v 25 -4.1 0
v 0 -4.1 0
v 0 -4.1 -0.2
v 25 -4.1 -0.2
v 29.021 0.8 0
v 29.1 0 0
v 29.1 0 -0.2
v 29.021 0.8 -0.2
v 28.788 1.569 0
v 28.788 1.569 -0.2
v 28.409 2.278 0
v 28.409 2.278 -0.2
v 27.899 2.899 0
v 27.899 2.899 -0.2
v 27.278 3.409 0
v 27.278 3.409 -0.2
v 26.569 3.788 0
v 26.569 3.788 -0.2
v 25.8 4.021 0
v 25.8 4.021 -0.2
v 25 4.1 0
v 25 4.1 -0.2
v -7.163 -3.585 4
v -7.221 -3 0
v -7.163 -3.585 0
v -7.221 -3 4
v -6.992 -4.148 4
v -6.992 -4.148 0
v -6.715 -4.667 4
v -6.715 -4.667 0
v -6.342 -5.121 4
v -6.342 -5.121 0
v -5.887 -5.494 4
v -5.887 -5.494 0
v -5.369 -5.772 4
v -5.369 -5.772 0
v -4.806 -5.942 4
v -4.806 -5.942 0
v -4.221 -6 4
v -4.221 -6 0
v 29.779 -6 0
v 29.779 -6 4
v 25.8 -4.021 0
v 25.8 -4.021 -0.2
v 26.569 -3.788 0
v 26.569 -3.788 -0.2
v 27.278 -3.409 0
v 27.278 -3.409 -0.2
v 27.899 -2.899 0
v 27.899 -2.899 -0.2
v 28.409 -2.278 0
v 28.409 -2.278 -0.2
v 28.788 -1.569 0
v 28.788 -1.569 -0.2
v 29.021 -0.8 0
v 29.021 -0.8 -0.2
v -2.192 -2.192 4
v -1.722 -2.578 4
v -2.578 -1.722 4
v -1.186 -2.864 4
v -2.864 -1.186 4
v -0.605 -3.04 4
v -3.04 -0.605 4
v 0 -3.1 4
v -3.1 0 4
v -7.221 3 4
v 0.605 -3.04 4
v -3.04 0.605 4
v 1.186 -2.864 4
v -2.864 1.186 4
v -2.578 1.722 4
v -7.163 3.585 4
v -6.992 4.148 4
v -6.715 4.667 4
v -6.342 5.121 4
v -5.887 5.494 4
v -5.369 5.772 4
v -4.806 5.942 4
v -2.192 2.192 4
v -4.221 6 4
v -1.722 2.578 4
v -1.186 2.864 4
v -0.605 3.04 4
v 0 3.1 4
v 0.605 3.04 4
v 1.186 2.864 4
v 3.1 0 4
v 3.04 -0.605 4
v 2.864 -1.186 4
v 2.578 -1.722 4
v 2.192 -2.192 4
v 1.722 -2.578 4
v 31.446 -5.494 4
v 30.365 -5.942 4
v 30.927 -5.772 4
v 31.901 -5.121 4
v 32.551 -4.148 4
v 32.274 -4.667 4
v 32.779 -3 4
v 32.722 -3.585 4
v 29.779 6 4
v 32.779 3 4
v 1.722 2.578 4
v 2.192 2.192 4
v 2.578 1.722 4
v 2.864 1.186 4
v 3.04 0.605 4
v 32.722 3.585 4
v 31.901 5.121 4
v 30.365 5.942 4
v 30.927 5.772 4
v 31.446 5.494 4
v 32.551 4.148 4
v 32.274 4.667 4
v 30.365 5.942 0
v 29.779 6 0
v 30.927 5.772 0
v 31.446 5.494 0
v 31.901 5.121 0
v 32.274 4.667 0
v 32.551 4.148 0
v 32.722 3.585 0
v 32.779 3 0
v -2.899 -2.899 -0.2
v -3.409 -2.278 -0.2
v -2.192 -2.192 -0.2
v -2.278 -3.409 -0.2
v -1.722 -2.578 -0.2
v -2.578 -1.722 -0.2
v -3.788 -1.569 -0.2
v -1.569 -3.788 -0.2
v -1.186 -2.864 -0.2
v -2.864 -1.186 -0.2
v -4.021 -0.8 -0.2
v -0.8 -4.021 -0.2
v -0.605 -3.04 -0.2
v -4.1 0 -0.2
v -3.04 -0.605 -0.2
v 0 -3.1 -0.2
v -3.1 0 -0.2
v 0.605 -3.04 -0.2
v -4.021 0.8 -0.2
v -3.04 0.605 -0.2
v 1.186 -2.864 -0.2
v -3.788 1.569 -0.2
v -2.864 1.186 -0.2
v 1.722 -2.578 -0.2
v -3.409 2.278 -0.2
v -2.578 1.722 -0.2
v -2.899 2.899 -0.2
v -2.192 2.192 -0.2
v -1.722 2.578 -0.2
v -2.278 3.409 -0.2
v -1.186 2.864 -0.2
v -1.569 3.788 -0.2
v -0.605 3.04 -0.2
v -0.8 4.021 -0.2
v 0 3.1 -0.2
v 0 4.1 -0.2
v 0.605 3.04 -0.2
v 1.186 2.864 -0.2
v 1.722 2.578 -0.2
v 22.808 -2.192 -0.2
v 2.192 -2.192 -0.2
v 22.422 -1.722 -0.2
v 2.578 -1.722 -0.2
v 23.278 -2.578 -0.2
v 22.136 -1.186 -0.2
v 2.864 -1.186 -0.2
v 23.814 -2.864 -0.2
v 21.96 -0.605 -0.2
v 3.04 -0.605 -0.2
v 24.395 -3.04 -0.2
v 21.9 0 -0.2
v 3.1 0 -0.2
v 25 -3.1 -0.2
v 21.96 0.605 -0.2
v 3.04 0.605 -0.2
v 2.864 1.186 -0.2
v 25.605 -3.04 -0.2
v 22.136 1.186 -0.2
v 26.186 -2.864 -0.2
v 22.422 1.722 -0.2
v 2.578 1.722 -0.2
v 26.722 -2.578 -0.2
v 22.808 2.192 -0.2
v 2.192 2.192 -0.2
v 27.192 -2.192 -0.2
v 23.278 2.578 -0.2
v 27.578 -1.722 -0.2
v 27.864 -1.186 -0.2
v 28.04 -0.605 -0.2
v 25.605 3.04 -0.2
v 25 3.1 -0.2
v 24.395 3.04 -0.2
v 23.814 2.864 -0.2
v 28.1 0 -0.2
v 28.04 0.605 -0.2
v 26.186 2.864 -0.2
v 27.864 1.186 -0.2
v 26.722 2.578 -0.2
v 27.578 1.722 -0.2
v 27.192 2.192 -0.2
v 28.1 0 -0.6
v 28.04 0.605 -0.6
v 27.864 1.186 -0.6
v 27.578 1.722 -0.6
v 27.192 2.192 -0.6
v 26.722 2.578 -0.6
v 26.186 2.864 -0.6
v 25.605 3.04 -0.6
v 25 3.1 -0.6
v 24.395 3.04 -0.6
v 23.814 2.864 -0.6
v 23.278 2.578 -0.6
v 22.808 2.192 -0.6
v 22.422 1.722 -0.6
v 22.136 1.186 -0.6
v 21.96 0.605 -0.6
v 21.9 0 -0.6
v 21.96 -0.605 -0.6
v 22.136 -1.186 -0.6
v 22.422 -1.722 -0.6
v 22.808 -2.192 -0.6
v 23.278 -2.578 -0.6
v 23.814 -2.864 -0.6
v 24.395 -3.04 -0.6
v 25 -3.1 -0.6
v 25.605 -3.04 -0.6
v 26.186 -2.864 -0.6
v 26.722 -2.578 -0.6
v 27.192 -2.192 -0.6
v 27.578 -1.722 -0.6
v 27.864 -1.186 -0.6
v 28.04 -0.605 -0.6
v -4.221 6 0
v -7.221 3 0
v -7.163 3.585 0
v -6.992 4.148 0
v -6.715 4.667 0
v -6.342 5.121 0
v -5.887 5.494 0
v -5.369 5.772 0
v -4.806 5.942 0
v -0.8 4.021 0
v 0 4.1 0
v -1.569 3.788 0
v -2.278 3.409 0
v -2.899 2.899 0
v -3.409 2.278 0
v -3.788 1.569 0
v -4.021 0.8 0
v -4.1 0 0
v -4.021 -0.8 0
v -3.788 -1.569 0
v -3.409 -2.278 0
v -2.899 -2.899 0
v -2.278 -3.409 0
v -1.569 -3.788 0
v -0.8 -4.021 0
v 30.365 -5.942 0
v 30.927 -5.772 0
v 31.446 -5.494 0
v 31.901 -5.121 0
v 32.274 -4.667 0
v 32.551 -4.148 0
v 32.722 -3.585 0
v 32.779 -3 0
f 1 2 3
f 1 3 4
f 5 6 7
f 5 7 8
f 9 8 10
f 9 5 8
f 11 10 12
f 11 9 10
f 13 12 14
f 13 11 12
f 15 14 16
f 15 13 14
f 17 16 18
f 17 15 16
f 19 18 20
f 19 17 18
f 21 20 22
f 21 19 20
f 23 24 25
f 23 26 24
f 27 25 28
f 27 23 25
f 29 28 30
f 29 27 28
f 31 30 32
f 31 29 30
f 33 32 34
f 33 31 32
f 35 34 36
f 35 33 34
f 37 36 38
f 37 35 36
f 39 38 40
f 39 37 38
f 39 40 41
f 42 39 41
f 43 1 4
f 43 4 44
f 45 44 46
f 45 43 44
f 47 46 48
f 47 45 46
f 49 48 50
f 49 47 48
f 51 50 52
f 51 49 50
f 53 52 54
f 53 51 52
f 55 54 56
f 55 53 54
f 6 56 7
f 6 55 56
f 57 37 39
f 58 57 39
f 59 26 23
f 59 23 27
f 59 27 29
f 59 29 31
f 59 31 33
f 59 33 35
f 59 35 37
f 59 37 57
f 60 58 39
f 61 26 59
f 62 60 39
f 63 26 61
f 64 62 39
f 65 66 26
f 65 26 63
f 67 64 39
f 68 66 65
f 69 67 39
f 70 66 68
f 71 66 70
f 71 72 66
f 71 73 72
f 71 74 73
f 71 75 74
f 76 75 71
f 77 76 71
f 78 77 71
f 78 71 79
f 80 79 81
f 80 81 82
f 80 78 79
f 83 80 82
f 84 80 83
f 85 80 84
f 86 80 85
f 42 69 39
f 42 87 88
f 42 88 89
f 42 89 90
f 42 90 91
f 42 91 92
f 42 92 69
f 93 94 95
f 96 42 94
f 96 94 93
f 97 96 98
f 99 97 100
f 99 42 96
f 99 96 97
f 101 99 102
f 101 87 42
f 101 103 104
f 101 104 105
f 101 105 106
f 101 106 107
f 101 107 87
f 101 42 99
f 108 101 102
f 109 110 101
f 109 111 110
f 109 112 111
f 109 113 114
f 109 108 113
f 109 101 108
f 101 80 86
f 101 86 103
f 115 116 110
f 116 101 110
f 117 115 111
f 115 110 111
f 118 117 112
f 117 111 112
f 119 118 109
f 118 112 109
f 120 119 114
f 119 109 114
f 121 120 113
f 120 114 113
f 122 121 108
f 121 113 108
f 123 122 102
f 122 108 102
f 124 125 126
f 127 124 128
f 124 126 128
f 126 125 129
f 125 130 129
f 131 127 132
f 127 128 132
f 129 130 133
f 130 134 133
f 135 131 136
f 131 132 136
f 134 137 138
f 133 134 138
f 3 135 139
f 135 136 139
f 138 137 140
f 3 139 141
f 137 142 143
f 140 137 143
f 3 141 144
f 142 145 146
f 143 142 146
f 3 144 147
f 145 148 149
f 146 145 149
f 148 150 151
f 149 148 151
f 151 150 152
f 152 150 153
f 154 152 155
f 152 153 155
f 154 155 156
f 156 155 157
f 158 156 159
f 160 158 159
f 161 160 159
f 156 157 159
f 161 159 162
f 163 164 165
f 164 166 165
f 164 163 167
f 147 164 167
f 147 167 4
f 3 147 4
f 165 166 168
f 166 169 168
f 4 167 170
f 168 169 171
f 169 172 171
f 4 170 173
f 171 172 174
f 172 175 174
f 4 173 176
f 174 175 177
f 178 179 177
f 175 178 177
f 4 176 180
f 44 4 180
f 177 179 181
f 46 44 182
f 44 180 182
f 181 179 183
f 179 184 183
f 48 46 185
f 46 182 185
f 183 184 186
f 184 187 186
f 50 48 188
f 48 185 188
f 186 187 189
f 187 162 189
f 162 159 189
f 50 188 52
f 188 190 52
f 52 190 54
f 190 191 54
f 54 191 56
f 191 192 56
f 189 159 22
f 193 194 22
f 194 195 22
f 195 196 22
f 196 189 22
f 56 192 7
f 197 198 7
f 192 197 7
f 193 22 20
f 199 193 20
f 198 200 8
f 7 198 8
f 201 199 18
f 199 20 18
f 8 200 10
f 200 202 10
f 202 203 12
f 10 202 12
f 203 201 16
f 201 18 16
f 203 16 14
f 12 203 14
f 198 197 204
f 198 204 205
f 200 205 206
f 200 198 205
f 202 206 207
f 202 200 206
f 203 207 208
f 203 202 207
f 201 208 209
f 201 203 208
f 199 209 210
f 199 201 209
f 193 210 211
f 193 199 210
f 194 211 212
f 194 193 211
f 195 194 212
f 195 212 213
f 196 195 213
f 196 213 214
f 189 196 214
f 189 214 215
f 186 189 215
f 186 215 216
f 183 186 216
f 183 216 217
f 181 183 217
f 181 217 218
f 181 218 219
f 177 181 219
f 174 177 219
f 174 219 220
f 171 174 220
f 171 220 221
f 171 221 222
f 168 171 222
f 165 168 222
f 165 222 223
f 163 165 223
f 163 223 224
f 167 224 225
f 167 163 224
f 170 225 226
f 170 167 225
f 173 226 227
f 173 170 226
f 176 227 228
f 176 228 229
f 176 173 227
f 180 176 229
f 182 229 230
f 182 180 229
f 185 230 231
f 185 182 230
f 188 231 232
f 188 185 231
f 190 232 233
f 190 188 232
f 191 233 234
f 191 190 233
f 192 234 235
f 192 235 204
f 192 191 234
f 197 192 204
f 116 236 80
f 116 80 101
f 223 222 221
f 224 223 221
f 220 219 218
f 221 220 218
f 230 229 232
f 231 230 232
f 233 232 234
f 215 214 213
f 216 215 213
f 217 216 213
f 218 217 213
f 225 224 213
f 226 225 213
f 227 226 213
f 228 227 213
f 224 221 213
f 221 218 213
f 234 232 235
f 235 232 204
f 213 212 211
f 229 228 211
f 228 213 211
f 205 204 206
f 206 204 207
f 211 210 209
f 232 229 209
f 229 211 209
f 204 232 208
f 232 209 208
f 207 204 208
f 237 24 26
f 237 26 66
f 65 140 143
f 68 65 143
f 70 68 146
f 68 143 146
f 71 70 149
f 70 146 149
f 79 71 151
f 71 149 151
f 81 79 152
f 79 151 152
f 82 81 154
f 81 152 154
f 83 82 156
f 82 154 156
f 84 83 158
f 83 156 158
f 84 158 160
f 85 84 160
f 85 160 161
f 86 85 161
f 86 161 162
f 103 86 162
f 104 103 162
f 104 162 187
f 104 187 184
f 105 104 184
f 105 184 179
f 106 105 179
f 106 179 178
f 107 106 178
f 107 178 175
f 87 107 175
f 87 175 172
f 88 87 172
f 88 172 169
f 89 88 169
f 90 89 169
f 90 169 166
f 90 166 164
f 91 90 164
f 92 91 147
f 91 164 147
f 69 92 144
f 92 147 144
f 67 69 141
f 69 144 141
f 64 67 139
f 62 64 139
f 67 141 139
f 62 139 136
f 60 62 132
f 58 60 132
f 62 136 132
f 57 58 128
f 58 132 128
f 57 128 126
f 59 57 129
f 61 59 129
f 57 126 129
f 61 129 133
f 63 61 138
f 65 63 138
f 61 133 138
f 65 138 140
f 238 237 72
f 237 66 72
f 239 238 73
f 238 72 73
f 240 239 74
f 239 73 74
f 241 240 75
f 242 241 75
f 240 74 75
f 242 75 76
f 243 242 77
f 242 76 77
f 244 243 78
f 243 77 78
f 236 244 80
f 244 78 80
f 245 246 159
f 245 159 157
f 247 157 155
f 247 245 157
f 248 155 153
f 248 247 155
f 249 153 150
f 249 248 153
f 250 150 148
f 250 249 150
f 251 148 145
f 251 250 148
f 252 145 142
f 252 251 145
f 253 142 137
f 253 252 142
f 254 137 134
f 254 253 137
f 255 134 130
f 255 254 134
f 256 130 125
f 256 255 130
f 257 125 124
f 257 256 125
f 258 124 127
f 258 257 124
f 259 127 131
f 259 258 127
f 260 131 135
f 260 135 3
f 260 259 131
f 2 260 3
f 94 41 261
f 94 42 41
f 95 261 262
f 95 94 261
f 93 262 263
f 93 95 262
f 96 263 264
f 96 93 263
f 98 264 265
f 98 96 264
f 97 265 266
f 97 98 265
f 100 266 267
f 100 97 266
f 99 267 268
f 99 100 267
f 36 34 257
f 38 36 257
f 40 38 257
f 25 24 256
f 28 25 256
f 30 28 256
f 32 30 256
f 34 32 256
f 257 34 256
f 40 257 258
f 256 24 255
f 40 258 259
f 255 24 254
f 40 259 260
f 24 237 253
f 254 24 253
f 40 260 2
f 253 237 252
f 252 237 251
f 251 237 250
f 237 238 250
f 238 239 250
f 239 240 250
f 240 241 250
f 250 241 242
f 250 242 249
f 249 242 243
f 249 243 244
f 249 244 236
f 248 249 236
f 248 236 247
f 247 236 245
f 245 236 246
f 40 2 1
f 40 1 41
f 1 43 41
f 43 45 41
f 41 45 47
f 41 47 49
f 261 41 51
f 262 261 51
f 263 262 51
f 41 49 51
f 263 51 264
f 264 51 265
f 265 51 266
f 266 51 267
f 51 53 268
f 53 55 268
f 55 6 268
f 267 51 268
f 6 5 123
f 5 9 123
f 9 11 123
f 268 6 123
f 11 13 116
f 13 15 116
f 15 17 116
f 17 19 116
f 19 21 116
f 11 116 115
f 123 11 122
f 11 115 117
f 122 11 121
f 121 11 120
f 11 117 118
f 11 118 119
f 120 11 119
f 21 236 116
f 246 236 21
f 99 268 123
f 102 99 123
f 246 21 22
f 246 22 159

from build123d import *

# Parameters (mm, degrees)
F2_DEPTH = 0.2
F0_W     = 40
F0_H     = 12
F4_DEPTH = 4
F5_R     = 3
F7_D     = 6.2
F3_R     = 3.1
F8_DEPTH = 0.6


with BuildPart() as f2:
    # F1 (on Top) → F2 (new body)
    with BuildSketch(Plane.XY):
        with BuildLine():
            ThreePointArc((0, -4.1), (2.899138, -2.899138), (4.1, 0))
            ThreePointArc((4.1, 0), (2.899138, 2.899138), (0, 4.1))
            ThreePointArc((0, 4.1), (-4.1, 0), (0, -4.1))
        make_face()
        with BuildLine():
            ThreePointArc((0, 4.1), (2.899138, 2.899138), (4.1, 0))
            ThreePointArc((4.1, 0), (2.899138, -2.899138), (0, -4.1))
            Line((0, -4.1), (25, -4.1))
            ThreePointArc((25, -4.1), (20.9, 0), (25, 4.1))
            Line((25, 4.1), (0, 4.1))
        make_face()
        with BuildLine():
            ThreePointArc((29.1, 0), (27.899138, 2.899138), (25, 4.1))
            ThreePointArc((25, 4.1), (20.9, 0), (25, -4.1))
            ThreePointArc((25, -4.1), (27.899138, -2.899138), (29.1, 0))
        make_face()
    extrude(amount=-F2_DEPTH)

    # F0 (on Top) → F4 (join)
    with BuildSketch(Plane.XY):
        with Locations((12.779413, 0)):
            Rectangle(F0_W, F0_H)
    extrude(amount=F4_DEPTH)

    # F5
    f5_edges = [f2.edges().sort_by_distance(p)[0] for p in [
        (32.779413, -6, 2),
        (32.779413, 6, 2),
        (-7.220587, -6, 2),
        (-7.220587, 6, 2),
    ]]
    fillet(f5_edges, radius=F5_R)

    # F7 (through all)
    with Locations(Plane.XY.offset(4)):
        with Locations((0, 0)):
            Hole(F7_D / 2)

    # F3 (on Top) → F8 (join)
    with BuildSketch(Plane.XY):
        with Locations((25, 0)):
            Circle(F3_R)
    extrude(amount=-F8_DEPTH)


solid = f2.part
